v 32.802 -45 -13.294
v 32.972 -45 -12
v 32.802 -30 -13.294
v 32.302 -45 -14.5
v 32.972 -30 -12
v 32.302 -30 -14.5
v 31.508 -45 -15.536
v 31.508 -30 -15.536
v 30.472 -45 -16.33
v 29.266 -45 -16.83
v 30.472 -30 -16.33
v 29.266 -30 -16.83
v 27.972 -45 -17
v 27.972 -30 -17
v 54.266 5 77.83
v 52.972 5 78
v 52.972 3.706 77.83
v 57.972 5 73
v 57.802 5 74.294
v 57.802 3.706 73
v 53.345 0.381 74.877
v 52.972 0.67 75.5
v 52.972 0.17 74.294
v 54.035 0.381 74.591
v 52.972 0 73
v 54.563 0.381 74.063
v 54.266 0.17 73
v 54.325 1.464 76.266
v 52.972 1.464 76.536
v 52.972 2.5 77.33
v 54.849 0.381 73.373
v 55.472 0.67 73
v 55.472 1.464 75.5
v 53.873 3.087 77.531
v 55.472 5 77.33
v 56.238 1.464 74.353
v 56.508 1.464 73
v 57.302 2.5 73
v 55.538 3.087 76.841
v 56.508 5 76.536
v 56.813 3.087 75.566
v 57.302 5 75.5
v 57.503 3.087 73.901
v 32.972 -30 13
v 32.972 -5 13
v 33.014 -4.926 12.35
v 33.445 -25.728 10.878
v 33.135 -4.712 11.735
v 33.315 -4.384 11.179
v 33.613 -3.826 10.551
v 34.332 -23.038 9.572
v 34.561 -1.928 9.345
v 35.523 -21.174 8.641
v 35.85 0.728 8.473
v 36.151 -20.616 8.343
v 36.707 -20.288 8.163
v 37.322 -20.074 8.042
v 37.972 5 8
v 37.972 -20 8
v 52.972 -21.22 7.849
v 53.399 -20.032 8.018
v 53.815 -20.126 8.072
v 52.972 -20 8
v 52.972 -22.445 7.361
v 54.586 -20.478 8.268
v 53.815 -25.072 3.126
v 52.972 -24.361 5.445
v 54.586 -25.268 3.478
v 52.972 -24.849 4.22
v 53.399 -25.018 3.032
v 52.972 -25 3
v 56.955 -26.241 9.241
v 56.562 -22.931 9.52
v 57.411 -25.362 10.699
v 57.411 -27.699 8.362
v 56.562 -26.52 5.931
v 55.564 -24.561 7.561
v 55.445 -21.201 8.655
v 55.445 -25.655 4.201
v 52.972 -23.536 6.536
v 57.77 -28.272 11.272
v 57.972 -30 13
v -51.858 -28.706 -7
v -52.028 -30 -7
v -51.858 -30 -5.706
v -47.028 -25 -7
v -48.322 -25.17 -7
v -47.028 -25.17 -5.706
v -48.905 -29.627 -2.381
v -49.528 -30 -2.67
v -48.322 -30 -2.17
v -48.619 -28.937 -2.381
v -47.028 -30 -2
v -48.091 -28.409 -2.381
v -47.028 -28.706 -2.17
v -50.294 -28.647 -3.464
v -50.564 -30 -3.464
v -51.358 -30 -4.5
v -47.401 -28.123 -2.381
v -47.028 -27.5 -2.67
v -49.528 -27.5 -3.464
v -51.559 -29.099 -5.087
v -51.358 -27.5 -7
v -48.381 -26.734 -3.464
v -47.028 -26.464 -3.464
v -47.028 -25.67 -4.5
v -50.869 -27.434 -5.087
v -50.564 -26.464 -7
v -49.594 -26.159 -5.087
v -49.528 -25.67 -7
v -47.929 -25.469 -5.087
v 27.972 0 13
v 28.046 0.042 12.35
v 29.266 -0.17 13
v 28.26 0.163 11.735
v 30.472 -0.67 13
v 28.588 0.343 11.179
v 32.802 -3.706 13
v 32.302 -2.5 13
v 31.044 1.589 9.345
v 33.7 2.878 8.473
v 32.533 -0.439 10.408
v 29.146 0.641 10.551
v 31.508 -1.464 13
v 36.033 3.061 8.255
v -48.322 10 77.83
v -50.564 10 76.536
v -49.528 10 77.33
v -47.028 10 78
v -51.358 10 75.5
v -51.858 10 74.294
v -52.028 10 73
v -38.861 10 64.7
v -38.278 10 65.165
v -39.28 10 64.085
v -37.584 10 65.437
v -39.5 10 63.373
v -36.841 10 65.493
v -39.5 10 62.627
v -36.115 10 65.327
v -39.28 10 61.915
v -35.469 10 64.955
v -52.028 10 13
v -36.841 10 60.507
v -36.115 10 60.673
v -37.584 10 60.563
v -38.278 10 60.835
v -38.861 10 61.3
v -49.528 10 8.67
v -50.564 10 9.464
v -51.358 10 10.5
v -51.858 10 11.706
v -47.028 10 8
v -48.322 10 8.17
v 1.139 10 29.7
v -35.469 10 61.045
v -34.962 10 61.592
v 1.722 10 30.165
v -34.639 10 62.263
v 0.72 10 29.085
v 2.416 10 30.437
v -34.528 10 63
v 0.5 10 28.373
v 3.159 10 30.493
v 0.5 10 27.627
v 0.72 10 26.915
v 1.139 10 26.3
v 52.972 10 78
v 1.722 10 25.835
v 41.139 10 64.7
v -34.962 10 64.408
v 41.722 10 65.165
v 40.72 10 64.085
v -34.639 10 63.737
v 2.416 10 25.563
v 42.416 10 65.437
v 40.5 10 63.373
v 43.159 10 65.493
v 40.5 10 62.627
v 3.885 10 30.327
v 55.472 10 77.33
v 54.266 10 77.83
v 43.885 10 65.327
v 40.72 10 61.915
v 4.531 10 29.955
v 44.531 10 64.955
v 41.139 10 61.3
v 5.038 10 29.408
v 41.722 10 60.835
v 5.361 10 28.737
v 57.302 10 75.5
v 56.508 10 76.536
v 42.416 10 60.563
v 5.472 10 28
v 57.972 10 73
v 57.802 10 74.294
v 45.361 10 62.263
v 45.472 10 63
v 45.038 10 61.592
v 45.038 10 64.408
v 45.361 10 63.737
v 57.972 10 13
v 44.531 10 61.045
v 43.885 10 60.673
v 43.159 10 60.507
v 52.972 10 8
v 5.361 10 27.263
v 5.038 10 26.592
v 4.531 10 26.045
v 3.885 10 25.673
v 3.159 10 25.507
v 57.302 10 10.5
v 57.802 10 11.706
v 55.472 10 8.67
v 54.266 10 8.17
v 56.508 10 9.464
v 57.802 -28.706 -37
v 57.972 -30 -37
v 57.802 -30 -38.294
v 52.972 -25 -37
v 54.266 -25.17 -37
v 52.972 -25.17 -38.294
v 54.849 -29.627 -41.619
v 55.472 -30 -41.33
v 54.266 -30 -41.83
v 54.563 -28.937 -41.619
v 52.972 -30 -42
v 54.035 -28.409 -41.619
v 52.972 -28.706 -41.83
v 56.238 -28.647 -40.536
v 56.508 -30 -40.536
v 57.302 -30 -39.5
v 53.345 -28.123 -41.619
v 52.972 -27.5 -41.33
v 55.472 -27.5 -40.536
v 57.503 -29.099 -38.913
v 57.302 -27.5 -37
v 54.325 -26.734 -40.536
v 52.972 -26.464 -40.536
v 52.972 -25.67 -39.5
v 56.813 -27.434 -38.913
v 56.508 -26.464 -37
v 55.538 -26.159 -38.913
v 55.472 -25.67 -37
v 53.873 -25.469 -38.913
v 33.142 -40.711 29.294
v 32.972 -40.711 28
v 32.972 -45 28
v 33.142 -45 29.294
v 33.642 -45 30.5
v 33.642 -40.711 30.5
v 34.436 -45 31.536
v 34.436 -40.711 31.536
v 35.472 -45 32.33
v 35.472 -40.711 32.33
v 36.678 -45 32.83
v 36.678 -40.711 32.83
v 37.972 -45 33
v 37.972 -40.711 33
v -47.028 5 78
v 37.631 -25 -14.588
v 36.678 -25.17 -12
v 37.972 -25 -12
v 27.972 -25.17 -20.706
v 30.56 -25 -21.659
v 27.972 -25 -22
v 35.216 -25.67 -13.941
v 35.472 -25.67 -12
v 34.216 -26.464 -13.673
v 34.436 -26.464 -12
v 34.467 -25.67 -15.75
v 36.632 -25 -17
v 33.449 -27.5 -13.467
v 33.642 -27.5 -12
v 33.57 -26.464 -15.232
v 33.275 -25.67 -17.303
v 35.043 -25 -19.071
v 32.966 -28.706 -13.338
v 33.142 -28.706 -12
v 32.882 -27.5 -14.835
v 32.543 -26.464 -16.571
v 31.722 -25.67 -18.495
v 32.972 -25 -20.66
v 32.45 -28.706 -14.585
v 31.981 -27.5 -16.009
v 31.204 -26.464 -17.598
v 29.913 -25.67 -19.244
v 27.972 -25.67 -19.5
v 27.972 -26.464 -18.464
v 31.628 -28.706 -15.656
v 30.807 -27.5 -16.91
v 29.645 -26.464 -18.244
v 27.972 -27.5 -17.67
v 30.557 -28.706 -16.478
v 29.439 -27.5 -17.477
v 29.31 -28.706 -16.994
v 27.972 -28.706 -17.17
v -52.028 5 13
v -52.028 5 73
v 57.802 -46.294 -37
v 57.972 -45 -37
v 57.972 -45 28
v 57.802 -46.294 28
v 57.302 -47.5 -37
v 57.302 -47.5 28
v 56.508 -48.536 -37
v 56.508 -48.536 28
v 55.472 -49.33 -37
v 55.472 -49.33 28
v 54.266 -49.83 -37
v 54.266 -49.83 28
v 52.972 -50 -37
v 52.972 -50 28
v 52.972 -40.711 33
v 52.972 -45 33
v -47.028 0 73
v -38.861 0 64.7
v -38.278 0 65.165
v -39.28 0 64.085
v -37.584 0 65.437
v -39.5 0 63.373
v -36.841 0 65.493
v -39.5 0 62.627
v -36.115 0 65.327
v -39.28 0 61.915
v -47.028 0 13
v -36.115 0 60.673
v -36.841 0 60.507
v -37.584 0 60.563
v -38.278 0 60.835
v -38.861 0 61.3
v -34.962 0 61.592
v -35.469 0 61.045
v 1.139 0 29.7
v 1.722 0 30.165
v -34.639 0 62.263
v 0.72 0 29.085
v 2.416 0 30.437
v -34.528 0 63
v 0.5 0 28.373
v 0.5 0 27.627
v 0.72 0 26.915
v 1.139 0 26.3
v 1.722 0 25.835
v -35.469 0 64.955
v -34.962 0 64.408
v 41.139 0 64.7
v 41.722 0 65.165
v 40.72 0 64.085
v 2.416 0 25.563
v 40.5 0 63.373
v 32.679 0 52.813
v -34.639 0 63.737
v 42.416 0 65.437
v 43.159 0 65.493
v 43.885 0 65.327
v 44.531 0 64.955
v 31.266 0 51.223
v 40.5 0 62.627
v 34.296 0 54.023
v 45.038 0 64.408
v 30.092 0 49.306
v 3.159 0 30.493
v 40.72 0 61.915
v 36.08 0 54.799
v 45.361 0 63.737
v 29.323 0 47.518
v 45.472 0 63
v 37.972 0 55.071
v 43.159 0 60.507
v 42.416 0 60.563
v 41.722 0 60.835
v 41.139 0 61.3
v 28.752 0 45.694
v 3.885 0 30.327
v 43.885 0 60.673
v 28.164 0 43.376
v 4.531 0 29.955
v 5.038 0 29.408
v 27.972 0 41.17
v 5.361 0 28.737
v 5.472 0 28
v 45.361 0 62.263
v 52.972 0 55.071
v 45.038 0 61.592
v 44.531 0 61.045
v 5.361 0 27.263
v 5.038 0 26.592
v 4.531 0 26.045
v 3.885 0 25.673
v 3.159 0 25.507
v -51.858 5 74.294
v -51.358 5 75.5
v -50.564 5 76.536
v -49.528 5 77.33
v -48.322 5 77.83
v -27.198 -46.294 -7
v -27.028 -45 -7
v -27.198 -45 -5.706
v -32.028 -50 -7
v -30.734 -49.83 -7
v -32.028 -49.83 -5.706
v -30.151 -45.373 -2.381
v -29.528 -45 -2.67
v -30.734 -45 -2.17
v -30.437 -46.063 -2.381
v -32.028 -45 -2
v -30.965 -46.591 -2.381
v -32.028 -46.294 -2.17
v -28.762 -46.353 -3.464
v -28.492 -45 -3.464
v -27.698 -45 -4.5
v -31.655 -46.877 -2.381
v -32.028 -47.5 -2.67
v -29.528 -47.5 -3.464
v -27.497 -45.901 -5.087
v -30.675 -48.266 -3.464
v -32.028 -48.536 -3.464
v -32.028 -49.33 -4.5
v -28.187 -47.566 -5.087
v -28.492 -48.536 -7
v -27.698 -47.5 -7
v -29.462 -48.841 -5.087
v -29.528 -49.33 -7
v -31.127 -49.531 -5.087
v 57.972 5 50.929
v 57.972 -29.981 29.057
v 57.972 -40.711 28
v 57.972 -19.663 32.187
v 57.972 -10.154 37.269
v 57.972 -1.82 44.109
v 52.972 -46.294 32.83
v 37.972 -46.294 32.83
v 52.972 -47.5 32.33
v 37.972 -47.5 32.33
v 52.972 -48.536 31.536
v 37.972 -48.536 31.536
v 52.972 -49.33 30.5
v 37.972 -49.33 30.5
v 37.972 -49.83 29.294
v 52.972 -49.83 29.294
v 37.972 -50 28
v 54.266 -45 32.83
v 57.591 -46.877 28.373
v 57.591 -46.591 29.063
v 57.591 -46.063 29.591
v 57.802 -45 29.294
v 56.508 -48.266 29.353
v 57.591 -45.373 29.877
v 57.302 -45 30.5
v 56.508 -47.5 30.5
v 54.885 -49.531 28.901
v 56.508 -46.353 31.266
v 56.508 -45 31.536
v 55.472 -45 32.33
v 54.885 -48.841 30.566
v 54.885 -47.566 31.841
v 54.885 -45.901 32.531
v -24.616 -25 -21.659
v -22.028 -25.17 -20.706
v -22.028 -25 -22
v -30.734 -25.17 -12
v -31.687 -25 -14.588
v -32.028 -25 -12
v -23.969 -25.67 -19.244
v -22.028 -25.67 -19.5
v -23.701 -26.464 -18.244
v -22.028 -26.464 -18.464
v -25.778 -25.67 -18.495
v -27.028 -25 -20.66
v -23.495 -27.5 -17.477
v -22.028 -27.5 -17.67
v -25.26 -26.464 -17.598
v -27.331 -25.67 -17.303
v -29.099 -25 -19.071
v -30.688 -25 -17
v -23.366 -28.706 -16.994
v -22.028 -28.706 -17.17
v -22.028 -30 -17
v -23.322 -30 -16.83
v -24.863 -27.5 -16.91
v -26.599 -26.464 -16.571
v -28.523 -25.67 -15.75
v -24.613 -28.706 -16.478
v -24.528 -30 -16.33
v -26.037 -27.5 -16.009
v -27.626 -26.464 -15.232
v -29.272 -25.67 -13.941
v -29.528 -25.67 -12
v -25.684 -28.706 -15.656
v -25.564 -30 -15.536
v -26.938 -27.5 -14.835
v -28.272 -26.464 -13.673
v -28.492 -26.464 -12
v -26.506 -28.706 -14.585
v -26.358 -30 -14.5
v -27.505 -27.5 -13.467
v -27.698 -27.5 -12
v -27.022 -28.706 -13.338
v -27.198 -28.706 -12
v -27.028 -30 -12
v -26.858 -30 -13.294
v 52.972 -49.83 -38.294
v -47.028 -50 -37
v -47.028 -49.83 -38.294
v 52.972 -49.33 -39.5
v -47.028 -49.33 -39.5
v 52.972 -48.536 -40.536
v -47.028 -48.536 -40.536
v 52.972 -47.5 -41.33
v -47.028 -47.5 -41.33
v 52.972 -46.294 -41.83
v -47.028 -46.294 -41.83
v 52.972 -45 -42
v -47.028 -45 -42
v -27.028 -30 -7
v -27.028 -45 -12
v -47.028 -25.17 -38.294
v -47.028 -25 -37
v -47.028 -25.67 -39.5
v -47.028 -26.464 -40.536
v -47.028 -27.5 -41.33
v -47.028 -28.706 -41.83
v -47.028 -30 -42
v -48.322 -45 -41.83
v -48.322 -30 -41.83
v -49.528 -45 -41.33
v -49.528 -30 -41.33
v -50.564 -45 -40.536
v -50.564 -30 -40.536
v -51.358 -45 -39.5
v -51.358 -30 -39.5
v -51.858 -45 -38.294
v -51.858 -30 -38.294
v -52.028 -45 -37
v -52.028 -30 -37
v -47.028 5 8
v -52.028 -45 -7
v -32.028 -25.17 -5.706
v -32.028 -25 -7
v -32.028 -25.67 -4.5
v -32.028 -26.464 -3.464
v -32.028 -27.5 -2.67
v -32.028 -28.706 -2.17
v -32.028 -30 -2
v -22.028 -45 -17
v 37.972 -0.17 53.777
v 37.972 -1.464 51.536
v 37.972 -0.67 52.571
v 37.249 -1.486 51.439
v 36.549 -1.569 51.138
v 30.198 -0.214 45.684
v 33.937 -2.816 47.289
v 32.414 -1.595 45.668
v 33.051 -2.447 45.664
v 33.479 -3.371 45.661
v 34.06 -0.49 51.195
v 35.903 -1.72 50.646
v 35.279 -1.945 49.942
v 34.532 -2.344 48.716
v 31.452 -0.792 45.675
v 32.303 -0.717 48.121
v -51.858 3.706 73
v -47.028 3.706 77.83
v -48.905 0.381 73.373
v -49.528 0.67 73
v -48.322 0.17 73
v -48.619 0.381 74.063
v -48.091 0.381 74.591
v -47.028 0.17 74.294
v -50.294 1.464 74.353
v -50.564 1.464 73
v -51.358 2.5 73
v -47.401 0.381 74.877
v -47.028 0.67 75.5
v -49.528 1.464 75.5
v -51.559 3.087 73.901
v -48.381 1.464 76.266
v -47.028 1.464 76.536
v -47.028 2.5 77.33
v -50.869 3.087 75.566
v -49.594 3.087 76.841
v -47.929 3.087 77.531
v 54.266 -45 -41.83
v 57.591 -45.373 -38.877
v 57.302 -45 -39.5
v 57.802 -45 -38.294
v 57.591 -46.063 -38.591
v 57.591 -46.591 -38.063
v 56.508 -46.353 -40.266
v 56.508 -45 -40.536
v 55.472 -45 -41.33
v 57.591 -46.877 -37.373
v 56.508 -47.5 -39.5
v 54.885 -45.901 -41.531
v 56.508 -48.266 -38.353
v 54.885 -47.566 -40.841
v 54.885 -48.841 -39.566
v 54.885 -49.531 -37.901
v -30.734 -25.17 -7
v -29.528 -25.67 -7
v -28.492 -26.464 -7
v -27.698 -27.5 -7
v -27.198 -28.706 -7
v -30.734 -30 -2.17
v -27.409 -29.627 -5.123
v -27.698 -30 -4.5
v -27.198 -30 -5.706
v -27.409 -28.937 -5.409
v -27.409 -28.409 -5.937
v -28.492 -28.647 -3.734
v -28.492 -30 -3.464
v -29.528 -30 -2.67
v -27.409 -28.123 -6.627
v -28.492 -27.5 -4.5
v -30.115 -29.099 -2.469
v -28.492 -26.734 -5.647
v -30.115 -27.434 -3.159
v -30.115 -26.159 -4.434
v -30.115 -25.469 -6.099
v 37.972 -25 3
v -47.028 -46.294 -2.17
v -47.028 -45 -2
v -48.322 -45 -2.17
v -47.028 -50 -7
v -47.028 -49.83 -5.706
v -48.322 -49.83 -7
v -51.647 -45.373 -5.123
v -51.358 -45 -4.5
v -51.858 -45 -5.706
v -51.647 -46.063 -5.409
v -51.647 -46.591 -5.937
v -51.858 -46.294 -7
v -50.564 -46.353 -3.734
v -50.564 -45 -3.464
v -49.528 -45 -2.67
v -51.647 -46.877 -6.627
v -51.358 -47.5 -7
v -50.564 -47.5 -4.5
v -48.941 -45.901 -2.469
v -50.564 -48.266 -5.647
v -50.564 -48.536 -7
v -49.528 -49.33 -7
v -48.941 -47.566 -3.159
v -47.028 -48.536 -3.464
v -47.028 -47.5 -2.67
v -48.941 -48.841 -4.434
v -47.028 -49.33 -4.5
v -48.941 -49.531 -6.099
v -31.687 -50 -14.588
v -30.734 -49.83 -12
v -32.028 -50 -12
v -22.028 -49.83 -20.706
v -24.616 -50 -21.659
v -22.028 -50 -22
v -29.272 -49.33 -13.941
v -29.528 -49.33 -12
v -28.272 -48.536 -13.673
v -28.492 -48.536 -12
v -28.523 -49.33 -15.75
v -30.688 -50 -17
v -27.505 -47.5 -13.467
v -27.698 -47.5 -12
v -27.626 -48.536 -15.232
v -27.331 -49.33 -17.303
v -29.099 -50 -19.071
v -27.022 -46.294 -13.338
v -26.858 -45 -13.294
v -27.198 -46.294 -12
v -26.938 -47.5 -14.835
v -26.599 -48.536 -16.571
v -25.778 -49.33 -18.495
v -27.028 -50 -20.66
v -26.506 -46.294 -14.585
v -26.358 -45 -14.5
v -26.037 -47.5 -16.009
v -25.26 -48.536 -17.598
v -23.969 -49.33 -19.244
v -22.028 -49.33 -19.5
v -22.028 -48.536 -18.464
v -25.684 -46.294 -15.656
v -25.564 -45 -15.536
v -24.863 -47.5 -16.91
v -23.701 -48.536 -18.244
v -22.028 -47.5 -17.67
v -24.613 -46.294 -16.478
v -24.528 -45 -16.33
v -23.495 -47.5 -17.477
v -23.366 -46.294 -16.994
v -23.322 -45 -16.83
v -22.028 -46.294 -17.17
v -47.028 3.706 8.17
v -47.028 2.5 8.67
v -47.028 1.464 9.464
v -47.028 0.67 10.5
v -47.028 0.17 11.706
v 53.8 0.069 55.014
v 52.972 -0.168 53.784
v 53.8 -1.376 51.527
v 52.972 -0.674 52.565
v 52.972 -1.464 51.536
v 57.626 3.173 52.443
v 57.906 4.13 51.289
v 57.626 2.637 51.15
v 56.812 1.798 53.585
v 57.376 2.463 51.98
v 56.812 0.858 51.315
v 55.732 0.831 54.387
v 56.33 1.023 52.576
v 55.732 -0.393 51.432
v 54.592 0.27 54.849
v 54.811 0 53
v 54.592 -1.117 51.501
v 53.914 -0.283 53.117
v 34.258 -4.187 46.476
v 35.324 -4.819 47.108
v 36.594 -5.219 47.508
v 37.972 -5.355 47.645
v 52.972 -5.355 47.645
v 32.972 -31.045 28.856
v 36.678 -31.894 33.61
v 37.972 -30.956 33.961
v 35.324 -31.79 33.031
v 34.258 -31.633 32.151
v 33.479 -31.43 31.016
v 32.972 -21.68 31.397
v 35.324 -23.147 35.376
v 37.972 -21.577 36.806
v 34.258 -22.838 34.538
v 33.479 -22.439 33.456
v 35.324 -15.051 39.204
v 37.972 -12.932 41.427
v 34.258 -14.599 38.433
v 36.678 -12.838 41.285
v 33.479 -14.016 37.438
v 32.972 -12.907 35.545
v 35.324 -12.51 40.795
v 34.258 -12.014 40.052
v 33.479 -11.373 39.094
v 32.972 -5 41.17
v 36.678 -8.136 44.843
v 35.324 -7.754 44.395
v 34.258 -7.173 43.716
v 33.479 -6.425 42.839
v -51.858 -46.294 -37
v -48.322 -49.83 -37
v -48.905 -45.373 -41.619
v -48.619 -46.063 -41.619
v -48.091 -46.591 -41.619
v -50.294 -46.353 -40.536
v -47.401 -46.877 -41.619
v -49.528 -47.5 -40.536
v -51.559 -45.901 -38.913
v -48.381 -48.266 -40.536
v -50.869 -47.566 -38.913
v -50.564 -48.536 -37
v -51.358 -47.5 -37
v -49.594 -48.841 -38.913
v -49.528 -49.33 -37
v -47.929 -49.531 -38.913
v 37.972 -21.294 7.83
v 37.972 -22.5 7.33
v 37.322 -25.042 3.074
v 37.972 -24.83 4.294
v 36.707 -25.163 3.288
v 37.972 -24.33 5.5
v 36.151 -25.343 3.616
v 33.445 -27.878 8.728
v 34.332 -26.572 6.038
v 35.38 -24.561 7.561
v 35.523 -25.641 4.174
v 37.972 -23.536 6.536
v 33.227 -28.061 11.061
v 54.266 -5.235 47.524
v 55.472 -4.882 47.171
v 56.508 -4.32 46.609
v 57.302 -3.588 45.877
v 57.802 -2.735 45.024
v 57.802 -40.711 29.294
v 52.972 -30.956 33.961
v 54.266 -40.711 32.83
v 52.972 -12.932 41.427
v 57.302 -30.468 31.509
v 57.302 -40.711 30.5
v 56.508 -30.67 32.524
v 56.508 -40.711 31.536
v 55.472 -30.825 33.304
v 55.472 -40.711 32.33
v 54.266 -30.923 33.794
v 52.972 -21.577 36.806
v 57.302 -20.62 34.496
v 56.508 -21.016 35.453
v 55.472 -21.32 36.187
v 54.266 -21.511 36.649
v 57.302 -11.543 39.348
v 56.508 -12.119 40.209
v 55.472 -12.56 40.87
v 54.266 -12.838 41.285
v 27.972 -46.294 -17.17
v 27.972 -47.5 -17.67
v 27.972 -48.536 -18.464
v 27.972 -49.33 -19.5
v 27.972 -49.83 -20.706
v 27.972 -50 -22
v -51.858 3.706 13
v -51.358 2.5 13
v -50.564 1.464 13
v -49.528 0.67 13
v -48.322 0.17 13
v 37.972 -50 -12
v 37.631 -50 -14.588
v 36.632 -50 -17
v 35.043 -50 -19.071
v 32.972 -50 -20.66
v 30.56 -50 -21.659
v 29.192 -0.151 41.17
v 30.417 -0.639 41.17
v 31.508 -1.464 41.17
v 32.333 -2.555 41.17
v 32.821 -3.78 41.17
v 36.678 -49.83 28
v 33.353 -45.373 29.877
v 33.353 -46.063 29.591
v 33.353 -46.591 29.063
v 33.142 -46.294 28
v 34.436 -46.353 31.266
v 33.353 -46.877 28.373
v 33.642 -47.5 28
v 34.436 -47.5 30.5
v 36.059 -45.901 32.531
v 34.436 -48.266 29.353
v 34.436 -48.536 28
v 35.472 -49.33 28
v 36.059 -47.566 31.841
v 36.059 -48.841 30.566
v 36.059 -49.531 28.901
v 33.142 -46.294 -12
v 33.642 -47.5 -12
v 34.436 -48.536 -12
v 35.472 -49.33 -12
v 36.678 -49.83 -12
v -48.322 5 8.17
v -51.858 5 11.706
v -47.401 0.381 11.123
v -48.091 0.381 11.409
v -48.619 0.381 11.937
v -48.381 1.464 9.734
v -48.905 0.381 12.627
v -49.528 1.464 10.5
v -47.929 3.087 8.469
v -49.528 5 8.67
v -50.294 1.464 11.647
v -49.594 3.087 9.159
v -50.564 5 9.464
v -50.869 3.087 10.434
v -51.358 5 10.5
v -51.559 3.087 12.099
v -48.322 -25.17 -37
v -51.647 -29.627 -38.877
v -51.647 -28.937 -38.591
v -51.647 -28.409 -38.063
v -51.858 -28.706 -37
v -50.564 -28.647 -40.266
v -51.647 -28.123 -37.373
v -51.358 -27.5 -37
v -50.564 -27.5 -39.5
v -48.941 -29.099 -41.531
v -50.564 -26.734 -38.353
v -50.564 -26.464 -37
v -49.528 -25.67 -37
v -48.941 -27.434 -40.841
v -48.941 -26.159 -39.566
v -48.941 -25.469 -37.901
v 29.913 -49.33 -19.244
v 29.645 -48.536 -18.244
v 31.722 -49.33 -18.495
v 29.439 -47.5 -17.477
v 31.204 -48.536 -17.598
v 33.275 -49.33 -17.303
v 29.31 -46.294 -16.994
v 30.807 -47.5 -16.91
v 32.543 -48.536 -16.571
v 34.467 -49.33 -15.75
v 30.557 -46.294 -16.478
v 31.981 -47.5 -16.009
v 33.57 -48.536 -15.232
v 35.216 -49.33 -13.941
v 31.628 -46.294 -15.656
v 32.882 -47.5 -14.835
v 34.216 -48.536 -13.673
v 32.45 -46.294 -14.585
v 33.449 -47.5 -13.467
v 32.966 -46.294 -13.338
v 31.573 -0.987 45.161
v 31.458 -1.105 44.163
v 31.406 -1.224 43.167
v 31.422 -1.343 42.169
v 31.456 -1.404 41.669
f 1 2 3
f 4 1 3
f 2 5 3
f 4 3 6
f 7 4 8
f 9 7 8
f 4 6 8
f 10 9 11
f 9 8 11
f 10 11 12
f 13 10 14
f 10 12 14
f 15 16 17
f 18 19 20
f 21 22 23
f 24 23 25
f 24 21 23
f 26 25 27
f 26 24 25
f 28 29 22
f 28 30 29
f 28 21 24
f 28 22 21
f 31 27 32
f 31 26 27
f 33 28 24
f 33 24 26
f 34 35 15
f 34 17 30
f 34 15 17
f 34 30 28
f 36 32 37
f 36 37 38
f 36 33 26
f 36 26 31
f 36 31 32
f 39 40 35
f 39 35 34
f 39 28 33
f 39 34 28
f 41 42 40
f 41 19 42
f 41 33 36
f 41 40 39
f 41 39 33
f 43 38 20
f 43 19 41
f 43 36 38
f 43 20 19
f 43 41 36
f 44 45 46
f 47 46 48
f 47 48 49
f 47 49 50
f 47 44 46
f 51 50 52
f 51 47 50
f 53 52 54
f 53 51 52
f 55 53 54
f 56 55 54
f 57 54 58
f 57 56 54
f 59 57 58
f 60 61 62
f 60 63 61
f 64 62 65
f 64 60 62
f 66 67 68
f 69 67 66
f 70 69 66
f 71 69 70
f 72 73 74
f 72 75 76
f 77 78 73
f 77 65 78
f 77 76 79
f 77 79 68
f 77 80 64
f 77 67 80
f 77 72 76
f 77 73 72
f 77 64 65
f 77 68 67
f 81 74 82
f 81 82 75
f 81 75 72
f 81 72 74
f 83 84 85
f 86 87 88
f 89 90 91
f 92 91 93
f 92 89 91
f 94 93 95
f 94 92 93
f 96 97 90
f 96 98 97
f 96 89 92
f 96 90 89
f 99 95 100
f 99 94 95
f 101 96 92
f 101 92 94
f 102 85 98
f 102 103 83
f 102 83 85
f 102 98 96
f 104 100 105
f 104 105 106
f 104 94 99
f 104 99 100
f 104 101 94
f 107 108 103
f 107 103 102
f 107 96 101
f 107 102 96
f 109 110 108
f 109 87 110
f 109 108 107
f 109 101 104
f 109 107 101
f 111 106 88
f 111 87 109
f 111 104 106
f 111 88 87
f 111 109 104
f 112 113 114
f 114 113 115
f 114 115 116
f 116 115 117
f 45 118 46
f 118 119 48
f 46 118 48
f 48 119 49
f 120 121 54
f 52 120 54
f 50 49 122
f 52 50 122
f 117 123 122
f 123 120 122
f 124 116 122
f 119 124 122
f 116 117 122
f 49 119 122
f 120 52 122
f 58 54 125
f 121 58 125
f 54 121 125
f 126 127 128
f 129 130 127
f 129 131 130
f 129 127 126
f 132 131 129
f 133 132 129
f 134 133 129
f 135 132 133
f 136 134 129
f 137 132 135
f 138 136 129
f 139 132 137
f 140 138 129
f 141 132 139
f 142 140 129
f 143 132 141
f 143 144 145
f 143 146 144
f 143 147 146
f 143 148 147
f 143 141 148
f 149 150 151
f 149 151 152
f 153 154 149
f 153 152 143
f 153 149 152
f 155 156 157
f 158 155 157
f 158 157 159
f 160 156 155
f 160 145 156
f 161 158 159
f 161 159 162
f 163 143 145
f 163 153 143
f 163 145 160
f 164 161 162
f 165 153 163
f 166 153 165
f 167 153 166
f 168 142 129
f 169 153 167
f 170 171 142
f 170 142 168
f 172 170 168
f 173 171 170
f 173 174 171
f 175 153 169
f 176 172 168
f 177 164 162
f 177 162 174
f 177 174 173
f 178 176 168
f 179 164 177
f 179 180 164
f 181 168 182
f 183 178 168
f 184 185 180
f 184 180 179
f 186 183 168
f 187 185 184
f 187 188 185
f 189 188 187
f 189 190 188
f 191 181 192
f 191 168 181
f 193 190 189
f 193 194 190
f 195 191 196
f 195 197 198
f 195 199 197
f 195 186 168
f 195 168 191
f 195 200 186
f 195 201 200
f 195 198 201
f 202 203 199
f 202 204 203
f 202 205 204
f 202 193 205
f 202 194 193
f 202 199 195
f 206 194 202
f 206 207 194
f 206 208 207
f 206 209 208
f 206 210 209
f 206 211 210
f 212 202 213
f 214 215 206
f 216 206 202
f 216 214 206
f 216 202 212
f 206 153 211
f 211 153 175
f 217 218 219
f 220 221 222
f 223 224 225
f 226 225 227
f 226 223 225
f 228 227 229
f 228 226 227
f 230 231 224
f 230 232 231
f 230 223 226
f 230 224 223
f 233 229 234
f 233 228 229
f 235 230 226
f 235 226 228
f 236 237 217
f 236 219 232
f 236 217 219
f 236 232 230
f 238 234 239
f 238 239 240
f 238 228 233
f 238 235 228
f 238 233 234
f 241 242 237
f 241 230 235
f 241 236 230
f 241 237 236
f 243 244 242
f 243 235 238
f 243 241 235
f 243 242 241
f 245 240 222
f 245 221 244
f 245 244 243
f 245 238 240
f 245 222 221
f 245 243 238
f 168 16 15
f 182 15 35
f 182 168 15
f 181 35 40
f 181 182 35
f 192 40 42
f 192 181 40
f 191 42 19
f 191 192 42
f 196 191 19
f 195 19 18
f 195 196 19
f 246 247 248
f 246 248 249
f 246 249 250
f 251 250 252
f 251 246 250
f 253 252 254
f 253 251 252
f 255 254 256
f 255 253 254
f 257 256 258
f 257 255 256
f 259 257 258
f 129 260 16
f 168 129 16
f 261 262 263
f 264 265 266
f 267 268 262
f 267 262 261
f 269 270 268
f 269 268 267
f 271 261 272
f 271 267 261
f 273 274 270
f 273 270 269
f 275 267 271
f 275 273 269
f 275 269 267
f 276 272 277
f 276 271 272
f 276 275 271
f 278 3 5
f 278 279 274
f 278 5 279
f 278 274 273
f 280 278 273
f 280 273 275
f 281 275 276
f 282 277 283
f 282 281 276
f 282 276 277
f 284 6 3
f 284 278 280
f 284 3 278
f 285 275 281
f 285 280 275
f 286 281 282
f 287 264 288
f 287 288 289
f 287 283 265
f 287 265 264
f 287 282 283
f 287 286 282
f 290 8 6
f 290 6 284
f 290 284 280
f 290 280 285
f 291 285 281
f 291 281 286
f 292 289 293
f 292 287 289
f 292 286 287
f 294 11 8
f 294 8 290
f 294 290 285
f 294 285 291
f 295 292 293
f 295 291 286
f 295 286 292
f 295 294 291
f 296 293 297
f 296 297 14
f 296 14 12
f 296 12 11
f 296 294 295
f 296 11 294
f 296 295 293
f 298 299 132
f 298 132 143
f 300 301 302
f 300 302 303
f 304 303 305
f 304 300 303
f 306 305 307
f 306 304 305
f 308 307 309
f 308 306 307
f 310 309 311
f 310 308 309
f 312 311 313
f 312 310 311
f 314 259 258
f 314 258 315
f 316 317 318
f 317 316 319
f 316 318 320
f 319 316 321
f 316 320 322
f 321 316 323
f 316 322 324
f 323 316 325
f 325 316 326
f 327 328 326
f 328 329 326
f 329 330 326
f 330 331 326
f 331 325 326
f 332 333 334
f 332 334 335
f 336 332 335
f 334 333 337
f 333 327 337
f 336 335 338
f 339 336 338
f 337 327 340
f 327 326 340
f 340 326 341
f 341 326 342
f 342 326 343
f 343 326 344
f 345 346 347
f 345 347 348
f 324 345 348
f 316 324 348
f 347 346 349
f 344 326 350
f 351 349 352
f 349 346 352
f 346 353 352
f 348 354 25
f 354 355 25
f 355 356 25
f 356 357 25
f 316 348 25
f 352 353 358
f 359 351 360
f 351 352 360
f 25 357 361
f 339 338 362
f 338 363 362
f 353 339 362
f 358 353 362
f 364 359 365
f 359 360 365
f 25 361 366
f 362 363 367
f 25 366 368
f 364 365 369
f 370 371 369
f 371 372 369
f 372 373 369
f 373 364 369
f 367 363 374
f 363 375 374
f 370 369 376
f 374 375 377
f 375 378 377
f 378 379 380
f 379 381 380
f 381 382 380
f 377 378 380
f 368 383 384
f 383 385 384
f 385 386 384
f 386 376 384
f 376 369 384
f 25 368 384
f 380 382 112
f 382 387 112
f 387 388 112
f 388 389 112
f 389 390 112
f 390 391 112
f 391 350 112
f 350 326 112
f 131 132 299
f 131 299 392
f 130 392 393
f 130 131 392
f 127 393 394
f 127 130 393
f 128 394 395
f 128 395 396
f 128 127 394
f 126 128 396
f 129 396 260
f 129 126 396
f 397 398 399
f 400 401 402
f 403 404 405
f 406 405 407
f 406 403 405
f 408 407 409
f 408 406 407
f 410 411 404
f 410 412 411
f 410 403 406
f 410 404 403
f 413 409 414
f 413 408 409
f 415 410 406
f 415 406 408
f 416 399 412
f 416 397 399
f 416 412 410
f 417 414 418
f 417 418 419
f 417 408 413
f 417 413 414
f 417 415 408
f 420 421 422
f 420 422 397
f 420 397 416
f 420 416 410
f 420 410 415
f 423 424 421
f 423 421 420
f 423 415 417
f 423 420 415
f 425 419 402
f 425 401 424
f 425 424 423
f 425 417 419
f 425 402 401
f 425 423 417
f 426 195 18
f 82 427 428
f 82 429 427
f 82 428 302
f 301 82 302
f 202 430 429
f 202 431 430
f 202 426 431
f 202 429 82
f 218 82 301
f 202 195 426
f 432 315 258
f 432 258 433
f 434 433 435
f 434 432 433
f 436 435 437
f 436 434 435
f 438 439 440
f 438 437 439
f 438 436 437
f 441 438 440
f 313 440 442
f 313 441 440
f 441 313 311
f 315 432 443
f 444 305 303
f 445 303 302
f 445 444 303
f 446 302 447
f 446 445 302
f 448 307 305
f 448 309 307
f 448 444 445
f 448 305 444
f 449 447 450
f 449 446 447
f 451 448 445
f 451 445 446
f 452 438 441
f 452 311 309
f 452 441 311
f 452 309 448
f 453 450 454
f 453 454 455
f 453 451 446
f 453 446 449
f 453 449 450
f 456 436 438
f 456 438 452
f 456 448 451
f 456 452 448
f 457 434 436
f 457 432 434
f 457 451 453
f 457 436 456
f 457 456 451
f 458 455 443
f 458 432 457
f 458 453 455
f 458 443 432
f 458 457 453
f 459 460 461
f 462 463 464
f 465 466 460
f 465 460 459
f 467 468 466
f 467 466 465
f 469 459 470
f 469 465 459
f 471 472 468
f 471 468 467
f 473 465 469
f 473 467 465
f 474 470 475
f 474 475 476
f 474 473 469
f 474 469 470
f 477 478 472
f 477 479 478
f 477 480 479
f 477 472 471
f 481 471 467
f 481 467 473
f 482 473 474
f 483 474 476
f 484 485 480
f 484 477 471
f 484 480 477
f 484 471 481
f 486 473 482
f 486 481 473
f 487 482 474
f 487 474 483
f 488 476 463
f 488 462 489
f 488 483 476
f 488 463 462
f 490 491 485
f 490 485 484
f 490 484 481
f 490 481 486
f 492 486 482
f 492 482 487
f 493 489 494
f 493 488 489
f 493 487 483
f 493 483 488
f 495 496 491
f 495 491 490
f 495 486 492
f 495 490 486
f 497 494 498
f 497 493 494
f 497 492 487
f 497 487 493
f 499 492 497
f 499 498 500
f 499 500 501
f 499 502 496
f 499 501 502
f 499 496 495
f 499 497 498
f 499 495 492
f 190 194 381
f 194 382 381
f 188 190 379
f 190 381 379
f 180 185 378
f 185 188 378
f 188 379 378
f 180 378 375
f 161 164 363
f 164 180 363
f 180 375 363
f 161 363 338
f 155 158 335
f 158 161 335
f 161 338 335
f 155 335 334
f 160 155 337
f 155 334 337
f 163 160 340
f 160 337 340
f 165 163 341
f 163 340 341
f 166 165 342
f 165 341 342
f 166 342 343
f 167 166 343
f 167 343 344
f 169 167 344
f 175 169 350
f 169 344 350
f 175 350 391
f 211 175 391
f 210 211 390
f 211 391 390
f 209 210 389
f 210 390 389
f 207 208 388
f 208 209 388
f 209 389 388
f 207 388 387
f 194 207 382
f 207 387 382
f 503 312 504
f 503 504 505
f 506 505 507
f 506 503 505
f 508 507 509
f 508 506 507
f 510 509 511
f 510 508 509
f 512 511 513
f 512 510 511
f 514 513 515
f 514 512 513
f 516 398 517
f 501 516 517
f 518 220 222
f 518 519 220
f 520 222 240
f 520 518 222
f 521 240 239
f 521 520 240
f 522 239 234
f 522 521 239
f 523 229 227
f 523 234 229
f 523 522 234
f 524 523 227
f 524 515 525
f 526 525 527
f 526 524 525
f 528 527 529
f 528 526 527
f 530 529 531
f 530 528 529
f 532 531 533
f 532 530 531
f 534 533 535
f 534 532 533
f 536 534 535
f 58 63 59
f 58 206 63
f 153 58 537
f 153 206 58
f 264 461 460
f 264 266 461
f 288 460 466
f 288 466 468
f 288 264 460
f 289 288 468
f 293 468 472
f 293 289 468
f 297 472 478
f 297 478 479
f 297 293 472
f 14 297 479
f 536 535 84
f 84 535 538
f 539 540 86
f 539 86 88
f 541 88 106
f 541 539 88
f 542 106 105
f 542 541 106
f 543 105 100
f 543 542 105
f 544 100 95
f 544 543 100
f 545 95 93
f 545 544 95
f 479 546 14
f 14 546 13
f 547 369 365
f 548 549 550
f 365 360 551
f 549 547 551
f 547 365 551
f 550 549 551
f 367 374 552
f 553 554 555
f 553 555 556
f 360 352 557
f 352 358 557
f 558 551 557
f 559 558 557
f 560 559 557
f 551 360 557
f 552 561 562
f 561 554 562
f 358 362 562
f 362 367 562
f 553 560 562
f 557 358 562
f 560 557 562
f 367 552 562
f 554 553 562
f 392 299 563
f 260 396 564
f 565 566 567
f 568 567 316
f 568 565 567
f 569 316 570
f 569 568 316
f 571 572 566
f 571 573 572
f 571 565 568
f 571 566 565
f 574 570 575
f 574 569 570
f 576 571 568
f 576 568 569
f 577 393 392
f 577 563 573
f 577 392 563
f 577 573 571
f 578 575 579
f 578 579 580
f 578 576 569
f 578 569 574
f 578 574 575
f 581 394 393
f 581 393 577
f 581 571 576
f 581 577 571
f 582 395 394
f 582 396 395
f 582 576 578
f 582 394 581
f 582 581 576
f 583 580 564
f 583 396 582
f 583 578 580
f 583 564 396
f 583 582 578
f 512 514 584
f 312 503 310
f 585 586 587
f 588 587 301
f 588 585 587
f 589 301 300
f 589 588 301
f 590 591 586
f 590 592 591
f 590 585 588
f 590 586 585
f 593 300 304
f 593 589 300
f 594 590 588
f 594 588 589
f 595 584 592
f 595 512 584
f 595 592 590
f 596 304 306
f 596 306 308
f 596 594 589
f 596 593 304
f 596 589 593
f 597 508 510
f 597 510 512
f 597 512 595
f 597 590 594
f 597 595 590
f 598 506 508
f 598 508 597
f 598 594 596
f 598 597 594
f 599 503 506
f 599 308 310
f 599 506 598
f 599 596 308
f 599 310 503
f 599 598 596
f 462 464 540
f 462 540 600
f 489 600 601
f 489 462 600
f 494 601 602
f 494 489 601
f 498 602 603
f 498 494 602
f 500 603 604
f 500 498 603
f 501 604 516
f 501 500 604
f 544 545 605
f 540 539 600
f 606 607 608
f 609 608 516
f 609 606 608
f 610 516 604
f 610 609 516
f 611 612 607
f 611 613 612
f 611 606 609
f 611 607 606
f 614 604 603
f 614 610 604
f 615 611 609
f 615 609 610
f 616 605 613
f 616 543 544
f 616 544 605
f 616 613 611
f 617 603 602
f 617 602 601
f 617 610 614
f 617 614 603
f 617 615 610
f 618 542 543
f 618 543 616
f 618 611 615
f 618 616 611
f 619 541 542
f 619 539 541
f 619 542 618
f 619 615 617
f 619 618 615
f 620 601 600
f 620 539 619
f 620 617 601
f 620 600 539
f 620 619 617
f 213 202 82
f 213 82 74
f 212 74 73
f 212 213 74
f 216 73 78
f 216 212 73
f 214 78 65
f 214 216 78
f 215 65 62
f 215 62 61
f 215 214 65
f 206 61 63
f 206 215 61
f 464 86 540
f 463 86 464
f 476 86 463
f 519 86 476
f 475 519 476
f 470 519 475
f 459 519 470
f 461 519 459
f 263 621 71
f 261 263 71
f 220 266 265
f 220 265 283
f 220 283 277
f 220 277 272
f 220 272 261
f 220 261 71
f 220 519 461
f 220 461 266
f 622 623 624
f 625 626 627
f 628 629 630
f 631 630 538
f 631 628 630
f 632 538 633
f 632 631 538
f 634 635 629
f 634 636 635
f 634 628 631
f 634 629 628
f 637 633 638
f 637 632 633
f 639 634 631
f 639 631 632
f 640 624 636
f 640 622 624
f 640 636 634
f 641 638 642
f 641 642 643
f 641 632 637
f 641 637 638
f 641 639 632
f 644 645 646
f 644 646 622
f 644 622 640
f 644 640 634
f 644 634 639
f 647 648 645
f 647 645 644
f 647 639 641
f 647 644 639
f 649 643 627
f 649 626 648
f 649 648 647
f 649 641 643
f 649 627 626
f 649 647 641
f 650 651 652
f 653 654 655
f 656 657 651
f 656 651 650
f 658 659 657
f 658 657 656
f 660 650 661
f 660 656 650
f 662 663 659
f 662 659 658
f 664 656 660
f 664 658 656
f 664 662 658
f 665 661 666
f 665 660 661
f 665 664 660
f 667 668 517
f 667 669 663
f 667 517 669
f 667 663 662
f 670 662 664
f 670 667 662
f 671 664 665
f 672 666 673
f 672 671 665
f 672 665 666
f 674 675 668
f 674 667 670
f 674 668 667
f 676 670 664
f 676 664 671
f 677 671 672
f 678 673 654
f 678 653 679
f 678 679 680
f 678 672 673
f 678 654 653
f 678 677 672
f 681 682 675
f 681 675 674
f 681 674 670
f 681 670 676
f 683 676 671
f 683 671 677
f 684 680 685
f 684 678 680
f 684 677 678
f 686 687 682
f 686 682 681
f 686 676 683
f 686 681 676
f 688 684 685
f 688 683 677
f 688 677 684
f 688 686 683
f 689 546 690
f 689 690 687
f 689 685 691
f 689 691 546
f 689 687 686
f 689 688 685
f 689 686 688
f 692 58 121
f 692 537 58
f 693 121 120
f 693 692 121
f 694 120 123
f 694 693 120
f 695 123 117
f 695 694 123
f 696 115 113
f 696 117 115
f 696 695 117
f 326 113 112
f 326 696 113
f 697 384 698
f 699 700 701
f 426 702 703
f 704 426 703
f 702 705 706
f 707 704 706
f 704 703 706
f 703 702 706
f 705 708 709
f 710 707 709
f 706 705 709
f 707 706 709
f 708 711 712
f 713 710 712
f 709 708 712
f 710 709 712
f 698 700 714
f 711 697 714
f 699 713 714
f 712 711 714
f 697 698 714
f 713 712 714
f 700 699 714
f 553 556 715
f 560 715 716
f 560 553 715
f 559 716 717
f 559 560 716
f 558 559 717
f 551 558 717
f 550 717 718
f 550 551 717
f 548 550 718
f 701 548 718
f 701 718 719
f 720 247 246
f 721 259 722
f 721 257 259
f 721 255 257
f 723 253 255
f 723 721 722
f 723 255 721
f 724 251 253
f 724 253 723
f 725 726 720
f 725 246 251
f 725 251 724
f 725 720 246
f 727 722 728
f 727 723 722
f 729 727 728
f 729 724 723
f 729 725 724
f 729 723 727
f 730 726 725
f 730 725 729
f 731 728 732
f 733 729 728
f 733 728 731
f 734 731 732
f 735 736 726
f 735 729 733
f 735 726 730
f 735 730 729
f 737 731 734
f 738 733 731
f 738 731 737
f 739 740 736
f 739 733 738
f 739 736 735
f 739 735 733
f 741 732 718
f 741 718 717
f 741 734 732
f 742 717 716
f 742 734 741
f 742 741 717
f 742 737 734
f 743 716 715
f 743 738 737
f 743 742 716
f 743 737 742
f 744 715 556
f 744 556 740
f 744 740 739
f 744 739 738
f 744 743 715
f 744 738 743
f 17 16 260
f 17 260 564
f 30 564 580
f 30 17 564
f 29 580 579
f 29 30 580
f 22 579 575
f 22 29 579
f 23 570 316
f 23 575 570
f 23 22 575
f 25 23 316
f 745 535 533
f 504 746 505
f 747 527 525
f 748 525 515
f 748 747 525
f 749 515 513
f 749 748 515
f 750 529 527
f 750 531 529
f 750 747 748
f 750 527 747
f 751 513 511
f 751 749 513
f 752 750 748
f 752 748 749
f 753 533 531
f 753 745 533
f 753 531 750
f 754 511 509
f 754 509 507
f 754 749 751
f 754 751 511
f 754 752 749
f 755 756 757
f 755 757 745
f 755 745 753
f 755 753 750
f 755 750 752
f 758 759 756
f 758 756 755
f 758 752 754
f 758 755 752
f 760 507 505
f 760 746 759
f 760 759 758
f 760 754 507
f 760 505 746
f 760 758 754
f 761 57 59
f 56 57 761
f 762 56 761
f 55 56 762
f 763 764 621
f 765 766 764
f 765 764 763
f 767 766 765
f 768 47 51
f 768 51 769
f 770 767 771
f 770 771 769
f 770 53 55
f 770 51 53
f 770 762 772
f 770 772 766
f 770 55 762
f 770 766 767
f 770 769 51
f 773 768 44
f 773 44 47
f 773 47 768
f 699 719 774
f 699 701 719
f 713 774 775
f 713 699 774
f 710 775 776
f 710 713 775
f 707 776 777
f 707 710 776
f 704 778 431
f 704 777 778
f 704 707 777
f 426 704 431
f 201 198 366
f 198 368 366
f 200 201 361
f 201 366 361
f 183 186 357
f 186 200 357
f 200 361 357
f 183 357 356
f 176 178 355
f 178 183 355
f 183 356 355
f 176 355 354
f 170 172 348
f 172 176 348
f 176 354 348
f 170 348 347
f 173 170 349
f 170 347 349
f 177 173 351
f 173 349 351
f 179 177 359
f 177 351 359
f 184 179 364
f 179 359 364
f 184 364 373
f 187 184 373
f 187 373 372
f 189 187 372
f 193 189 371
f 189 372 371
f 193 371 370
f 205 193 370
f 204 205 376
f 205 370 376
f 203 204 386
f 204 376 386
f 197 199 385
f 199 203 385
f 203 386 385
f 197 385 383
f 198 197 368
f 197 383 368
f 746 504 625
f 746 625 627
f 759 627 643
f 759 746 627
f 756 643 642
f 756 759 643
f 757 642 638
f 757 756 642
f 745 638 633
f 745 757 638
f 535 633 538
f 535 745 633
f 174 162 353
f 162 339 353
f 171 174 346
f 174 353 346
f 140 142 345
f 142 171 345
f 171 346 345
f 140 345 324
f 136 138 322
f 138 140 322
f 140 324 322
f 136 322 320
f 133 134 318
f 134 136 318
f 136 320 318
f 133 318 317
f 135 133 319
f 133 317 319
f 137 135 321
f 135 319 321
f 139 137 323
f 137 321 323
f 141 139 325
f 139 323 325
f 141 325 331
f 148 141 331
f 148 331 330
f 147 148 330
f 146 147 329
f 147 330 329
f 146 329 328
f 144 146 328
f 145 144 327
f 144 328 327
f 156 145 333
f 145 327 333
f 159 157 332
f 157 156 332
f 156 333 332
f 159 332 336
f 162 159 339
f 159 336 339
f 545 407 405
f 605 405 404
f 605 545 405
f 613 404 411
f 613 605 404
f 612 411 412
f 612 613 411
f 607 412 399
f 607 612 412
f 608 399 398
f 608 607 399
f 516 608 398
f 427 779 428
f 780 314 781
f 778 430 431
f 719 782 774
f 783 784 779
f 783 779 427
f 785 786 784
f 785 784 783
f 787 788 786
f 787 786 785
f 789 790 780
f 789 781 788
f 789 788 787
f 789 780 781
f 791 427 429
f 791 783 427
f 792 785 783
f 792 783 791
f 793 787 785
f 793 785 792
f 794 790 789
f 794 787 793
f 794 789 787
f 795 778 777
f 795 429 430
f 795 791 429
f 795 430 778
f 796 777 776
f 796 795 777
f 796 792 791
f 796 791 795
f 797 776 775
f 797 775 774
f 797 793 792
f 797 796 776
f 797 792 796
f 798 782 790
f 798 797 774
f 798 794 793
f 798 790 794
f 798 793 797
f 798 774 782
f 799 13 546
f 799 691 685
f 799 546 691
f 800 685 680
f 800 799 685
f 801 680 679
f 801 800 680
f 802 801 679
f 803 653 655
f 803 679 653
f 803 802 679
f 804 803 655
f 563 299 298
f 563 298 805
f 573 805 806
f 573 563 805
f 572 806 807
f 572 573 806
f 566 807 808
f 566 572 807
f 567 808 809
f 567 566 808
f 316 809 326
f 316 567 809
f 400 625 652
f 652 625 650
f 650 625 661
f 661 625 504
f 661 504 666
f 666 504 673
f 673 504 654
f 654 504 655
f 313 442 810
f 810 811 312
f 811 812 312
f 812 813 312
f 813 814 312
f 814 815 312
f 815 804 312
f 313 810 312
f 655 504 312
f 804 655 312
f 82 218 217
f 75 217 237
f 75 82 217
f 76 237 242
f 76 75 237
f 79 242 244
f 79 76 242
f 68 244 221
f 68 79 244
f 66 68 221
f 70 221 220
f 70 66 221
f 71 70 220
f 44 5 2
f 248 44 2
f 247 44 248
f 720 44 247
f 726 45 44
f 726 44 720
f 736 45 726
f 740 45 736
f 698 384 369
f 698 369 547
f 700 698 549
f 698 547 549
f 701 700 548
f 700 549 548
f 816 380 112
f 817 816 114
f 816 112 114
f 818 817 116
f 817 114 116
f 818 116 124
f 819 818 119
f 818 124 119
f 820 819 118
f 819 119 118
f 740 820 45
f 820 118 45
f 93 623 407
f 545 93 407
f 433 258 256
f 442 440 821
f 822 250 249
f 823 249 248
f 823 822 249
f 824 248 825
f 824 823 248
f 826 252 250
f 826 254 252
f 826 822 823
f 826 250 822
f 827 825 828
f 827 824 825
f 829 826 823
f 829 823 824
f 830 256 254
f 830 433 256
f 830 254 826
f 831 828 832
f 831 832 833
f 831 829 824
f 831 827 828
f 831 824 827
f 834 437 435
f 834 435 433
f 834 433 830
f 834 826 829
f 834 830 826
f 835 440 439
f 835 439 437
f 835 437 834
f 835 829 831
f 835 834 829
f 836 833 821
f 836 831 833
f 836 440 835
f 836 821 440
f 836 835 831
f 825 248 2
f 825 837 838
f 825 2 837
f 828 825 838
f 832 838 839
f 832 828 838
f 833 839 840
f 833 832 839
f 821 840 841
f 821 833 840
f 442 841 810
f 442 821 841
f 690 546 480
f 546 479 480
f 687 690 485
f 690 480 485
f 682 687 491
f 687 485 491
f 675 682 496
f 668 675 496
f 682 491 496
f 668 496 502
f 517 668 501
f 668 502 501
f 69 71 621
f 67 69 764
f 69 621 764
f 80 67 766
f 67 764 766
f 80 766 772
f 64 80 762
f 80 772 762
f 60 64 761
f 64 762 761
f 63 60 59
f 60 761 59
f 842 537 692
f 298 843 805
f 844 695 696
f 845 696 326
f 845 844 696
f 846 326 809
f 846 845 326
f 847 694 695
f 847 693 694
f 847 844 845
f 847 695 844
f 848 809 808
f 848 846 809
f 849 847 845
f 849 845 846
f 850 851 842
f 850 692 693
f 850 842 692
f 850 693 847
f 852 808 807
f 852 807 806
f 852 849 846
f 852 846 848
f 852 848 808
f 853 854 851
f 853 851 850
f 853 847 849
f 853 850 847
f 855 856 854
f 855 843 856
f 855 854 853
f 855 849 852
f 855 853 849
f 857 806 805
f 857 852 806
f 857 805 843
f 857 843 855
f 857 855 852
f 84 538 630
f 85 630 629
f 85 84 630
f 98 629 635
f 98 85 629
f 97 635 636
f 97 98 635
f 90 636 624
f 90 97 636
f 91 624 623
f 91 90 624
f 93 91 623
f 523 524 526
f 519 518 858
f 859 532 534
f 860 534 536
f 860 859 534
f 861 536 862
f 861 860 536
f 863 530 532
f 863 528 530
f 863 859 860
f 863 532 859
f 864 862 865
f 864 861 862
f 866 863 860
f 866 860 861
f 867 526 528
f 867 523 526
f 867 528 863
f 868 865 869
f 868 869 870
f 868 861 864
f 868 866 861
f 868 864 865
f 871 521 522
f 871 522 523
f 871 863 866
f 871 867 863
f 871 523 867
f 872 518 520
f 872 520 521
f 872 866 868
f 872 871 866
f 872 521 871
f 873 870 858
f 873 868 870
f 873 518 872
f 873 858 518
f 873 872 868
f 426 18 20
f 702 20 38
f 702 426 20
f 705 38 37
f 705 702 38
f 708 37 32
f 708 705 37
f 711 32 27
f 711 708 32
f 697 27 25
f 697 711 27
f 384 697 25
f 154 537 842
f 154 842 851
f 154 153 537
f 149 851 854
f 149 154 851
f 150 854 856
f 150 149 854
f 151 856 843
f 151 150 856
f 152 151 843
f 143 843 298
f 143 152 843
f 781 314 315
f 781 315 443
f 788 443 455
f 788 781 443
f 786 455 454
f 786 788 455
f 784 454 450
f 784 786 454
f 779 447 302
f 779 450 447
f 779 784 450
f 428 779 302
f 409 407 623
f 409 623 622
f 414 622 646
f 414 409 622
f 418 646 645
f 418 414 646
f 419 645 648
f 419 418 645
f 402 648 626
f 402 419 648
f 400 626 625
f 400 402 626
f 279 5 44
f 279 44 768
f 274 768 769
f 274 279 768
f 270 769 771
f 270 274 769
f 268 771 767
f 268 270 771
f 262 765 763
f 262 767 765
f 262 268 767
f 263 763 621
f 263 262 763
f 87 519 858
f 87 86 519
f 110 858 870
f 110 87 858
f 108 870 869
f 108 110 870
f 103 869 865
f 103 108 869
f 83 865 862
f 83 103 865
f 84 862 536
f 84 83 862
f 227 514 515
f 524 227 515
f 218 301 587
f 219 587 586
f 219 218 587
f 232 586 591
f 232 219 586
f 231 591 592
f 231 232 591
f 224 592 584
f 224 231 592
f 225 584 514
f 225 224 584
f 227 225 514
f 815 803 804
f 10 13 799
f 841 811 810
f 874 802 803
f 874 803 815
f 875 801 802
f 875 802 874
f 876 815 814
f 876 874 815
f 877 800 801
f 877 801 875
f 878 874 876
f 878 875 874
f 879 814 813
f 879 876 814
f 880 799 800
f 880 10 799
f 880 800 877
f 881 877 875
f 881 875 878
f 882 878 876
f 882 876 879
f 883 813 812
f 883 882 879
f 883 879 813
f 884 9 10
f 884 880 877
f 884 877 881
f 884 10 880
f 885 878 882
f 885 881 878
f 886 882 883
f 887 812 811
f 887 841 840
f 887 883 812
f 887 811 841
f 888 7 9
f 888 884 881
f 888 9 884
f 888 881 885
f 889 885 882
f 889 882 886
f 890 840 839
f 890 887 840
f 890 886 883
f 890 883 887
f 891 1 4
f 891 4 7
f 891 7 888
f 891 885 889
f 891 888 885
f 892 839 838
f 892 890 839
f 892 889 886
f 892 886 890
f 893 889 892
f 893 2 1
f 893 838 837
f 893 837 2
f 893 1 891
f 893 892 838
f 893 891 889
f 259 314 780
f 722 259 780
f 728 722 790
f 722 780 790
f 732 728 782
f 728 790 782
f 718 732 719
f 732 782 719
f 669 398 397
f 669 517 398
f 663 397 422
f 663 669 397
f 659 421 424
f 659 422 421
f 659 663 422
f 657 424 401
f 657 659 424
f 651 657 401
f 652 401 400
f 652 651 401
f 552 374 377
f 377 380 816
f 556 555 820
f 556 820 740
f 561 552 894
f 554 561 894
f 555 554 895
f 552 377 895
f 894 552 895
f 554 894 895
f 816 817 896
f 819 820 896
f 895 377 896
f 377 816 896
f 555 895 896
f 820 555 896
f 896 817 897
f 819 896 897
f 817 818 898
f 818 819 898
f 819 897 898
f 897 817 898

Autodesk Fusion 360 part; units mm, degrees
sketch "Sketch1" plane through (0, 0, 0) normal (0, 1, 0) x (1, 0, 0)
  circle A0 centre (0, 0) radius 17 construction
  line L0 (-50, -17) -> (32, -17) construction
  line L1 (32, -17) -> (32, 83) construction
  line L2 (32, 83) -> (-50, 83) construction
  line L3 (-50, 83) -> (-50, -17) construction
  line L4 (-52.028, -78) -> (57.972, -78)
  line L5 (57.972, -78) -> (57.972, -8)
  line L6 (57.972, -8) -> (-52.028, -8)
  line L7 (57.972, -8) -> (32.972, -8)
  line L8 (32.972, -8) -> (32.972, -33)
  line L9 (32.972, -33) -> (57.972, -33)
  line L10 (57.972, -33) -> (57.972, -8)
  line L11 (-52.028, -78) -> (-52.028, -8)
  line L12 (-52.028, -8) -> (57.972, -8)
  line L13 (57.972, -8) -> (57.972, -33)
  line L14 (32.972, -8) -> (57.972, -8)
  line L15 (57.972, -8) -> (57.972, 42)
  line L16 (57.972, 42) -> (32.972, 42)
  line L17 (32.972, 42) -> (32.972, -8)
  line L18 (57.972, 42) -> (-52.028, 42)
  line L19 (-52.028, 42) -> (-52.028, 17)
  line L20 (-52.028, 17) -> (57.972, 17)
  line L21 (57.972, 17) -> (57.972, 42)
  line L22 (-52.028, 17) -> (-52.028, 2)
  line L23 (-52.028, 2) -> (-27.028, 2)
  line L24 (-27.028, 2) -> (-27.028, 17)
  circle A1 centre (-37.028, -63) radius 2.5
  circle A2 centre (42.972, -63) radius 2.5
  circle A3 centre (2.972, -28) radius 2.5
  line L25 (2.972, -78) -> (2.972, -8) construction
  dimension "d1" = 34
  dimension "d2" = 82
  dimension "d3" = 32
  dimension "d4" = 100
  dimension "d5" = 25
  dimension "d6" = 25
  dimension "d7" = 110
  dimension "d8" = 70
  dimension "d9" = 25
  dimension "d10" = 50
  dimension "d11" = 110
  dimension "d12" = 25
  dimension "d13" = 15
  dimension "d14" = 25
  dimension "d15" = 5
  dimension "d16" = 5
  dimension "d17" = 5
  dimension "d18" = 50
  dimension "d19" = 15
  dimension "d20" = 15
  dimension "d21" = 15
  dimension "d22" = 15
extrude "Extrude1" add sketch "Sketch1" along normal blind 10 contours L4 L5 L6 L8 L9 L11 L12 | L5 L6 L7 L8 L9 L10 L12 L13 L14
extrude "Extrude2" add sketch "Sketch1" against normal blind 25 contours L5 L6 L7 L8 L9 L10 L12 L13 L14
extrude "Extrude3" add sketch "Sketch1" along normal blind 25 from surface at -50 contours L5 L6 L7 L8 L9 L10 L12 L13 L14 | L6 L7 L12 L14 L15 L17 L20 | L17 L18 L19 L20 | L15 L16 L17 L18 L20 L21 | L20 L22 L23 L24
chamfer "Chamfer1" distance 20 angle 45 1 edges at (45.472, 0, 33)
fillet "Fillet1" radius 5 4 edges at (57.972, 5, 78) (-52.028, 5, 78) (-52.028, 5, 8) (57.972, -7.5, 8)
fillet "Fillet2" radius 50 1 edges at (45.472, -20, 33)
fillet "Fillet3" radius 5 27 edges at (45.472, -50, 33) (32.972, -50, 8) (2.972, -50, -17) (-27.028, -50, -9.5) (-39.528, -50, -2) (-52.028, -50, -22) (2.972, -50, -42) (57.972, -50, -4.5) (57.972, -25, -14.5) (2.972, -25, -42) (-52.028, -25, -22) (-52.028, -37.5, -2) (-52.028, -37.5, -42) (-39.528, -25, -2) (-27.028, -37.5, -2) (-27.028, -37.5, -17) (2.972, -25, -17) (32.972, -25, -4.5) (32.972, -12.5, 8) (32.972, -2.6777, 50.3223) (32.972, -21.5765, 36.806) (32.972, -45.3553, 33) (57.972, -45.3553, 33) (57.972, -21.5765, 36.806) (57.972, -2.6777, 50.3223) (32.972, -37.5, -17) (-27.028, -25, -9.5)
fillet "Fillet3" radius 5 1 edges at (57.972, -37.5, -42)
fillet "Fillet3" radius 5 7 edges at (-7.028, 0, 8) (-50.5635, 0, 9.4645) (-52.028, 0, 43) (-50.5635, 0, 76.5355) (2.972, 0, 78) (56.5075, 0, 76.5355) (57.972, 0, 63)
fillet "Fillet4" radius 5 5 edges at (34.4365, 1.4645, 9.4645) (32.972, 0, 29.4645) (34.4365, 0, 50.9289) (45.472, 0, 53) (56.5075, 1.4645, 52.3934)
fillet "Fillet5" radius 5 3 edges at (34.4365, -26.4645, 9.4645) (45.472, -25, 8) (56.5075, -26.4645, 9.4645)
equation "d3 = ( ( 34 / 2 ) * 1 mm ) + 15 mm"
